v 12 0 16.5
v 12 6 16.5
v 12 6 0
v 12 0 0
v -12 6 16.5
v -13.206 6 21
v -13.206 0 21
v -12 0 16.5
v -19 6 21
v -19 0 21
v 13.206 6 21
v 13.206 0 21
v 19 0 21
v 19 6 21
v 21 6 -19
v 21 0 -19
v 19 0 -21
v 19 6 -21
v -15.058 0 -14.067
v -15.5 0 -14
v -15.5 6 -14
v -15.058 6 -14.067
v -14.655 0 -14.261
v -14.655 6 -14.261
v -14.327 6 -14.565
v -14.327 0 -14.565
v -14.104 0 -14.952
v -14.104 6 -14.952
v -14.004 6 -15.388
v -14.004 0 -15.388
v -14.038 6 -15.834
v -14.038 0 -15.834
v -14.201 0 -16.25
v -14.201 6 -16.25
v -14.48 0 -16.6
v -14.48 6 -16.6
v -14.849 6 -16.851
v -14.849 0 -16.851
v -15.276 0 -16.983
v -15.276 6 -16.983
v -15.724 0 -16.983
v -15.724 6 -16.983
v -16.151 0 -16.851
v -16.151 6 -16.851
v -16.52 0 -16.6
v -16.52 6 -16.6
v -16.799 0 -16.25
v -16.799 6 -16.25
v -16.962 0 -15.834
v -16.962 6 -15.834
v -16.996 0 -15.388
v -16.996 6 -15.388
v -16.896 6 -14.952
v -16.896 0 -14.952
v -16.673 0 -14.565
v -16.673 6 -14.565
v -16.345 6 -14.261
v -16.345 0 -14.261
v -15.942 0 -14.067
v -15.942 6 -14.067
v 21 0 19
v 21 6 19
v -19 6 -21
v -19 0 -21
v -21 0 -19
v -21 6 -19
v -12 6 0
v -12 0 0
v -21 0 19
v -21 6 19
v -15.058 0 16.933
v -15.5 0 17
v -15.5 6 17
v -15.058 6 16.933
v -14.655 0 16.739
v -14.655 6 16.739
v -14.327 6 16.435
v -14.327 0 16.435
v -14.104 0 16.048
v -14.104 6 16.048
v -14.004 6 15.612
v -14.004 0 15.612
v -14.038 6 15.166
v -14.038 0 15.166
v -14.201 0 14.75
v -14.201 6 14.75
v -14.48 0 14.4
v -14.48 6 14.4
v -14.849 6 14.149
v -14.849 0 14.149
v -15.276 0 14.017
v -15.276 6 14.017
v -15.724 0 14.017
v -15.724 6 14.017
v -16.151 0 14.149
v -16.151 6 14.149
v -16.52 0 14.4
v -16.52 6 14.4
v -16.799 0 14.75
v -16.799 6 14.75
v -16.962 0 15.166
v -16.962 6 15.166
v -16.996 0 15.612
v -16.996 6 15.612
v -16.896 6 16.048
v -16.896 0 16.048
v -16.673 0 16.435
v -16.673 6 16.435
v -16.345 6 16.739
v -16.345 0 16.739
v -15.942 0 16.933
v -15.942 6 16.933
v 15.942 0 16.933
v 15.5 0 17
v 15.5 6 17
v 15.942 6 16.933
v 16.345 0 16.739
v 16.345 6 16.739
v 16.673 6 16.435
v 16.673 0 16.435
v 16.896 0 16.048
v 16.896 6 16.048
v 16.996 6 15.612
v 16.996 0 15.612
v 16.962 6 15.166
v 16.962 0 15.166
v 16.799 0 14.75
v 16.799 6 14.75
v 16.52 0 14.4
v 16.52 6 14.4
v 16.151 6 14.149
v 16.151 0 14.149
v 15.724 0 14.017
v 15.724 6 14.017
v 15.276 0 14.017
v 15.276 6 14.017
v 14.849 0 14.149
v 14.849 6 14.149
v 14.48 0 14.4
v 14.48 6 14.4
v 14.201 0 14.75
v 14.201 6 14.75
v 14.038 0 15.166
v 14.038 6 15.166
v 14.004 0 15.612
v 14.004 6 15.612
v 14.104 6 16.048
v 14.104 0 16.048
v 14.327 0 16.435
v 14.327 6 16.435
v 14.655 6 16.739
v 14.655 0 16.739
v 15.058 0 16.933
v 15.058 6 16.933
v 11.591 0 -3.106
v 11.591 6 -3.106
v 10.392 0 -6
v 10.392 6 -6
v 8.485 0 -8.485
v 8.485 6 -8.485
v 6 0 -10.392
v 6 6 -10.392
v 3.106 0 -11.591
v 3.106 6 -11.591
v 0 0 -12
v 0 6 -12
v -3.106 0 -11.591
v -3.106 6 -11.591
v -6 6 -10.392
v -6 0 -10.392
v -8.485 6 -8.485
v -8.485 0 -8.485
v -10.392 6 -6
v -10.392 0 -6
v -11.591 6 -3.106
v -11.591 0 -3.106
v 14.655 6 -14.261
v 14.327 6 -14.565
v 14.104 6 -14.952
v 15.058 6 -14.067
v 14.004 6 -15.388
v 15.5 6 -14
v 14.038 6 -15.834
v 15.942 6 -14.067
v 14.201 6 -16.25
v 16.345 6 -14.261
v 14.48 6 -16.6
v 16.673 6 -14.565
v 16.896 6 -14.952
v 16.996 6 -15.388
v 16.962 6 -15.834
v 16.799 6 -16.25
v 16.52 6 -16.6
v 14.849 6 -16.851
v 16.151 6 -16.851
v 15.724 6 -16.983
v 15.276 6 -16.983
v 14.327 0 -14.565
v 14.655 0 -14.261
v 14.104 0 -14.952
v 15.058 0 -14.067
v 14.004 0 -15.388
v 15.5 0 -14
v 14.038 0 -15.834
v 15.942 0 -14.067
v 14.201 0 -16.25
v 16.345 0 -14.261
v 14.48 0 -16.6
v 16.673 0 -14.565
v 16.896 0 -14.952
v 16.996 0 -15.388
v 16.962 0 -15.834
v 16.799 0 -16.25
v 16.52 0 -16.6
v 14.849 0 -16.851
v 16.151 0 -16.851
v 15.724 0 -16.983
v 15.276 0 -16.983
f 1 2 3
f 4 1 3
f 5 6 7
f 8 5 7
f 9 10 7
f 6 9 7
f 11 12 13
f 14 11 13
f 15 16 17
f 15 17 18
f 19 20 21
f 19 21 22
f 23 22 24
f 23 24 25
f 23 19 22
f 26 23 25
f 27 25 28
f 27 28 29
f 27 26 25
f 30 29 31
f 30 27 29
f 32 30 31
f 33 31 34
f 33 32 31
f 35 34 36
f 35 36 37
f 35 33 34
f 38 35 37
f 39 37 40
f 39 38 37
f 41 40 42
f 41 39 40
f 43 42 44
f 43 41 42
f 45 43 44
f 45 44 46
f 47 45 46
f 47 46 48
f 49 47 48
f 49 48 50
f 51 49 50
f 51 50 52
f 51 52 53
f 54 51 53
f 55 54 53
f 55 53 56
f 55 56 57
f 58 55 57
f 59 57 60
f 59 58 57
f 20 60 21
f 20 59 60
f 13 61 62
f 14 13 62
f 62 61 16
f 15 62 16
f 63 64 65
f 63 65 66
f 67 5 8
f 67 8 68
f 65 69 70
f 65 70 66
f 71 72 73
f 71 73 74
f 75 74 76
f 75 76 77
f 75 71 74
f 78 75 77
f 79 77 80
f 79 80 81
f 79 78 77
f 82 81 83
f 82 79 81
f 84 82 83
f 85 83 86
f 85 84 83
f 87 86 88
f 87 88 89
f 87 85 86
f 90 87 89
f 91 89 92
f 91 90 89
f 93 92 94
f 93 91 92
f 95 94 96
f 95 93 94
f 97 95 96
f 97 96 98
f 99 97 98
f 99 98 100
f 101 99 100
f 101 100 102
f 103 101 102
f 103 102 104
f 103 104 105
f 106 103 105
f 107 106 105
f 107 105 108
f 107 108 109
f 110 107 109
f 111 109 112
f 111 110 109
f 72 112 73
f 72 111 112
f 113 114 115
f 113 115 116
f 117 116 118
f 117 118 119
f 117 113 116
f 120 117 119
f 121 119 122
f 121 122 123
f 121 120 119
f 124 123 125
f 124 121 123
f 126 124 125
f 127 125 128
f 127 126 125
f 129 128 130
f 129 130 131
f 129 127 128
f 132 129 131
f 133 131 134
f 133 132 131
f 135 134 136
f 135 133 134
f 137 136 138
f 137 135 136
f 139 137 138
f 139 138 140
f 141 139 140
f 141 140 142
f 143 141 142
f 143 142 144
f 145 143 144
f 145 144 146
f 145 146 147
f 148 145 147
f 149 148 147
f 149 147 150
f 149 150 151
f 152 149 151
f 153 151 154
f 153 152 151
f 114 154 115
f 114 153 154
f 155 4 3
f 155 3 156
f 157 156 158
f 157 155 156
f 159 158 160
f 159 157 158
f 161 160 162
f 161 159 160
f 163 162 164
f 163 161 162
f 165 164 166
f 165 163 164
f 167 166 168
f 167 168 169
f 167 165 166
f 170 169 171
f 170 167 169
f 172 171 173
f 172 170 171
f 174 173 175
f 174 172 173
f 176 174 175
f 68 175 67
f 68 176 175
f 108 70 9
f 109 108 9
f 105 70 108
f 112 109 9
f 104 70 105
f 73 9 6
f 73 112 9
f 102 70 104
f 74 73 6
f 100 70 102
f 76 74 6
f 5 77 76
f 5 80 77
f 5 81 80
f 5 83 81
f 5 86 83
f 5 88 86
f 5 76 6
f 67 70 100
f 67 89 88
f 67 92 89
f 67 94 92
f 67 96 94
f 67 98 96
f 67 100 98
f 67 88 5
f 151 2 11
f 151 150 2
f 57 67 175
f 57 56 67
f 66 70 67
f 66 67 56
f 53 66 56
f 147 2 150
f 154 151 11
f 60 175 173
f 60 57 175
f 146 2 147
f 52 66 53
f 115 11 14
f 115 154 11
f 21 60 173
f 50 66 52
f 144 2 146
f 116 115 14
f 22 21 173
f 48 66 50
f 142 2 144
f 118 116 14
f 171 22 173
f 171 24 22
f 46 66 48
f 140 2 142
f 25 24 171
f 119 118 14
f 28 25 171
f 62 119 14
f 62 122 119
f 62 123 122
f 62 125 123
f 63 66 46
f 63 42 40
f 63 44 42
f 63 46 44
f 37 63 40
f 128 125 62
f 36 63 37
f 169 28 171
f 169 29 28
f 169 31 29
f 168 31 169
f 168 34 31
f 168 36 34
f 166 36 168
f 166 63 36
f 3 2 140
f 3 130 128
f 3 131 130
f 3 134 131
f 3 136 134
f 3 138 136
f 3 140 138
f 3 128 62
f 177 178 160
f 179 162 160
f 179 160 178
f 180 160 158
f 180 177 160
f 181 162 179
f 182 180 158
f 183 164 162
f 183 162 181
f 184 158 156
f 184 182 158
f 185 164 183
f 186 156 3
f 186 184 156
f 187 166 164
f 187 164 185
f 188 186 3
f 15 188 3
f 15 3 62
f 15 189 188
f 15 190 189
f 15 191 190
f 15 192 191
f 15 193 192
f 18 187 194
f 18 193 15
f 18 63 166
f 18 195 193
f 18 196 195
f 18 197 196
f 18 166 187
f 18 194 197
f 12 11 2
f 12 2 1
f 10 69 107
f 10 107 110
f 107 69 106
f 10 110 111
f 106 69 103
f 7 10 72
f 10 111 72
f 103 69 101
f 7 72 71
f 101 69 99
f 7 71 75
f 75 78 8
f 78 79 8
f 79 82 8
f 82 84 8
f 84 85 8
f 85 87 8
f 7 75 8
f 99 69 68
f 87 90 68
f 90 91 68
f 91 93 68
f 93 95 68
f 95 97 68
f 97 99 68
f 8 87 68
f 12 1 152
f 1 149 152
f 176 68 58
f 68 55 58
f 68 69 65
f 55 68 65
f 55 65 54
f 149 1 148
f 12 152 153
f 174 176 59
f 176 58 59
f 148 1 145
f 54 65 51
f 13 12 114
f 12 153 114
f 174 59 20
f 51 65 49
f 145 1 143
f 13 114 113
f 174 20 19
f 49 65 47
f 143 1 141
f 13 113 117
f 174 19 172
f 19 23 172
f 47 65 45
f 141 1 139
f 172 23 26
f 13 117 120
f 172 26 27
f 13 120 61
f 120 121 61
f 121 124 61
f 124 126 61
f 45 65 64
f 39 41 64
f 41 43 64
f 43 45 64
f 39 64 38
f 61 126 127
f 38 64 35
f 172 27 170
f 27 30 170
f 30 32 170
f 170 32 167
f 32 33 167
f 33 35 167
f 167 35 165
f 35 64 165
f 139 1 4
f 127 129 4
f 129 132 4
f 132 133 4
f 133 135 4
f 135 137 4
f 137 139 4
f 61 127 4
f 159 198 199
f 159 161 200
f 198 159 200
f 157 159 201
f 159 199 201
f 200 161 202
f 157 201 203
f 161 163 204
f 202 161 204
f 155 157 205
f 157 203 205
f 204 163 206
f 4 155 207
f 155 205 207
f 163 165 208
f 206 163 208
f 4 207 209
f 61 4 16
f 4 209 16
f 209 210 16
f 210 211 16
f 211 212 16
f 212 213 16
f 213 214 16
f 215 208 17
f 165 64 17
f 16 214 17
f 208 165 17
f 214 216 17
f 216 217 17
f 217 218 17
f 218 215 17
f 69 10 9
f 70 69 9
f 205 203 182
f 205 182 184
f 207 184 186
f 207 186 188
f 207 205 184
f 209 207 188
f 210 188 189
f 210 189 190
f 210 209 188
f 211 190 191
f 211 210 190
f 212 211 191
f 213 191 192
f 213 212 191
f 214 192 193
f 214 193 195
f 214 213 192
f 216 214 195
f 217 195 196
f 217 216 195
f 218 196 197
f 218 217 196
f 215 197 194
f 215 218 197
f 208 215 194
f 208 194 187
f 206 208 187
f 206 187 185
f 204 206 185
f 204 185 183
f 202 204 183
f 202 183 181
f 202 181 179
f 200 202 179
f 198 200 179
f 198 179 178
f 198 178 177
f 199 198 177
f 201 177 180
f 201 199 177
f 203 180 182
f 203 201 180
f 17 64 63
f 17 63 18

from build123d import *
from OCP.BRepFilletAPI import BRepFilletAPI_MakeChamfer

# Parameters (mm, degrees)
SKETCH1_W           = 42
SKETCH1_H           = 42
SKETCH1_R           = 12
SKETCH1_R_2         = 1.5
BOSS_EXTRUDE1_DEPTH = 6
CHAMFER1_SIZE       = 2
SKETCH2_W           = 24
SKETCH2_H           = 21
CUT_EXTRUDE1_DEPTH  = 31.298514815
CHAMFER2_SIZE       = 4.5
CHAMFER2_SIZE2      = 1.205771366


with BuildPart() as part:
    # Sketch1 → Boss-Extrude1 (new body)
    with BuildSketch(Plane(origin=(0, 0, 0), x_dir=(1, 0, 0), z_dir=(0, 1, 0))):
        Rectangle(SKETCH1_W, SKETCH1_H)
        with Locations(Location((0, 0, 0), (0, 0, 270))):
            Circle(SKETCH1_R, mode=Mode.SUBTRACT)
        with Locations(Location((-15.5, 15.5, 0), (0, 0, 270))):
            Circle(SKETCH1_R_2, mode=Mode.SUBTRACT)
        with Locations(Location((15.5, 15.5, 0), (0, 0, 270))):
            Circle(SKETCH1_R_2, mode=Mode.SUBTRACT)
        with Locations(Location((15.5, -15.5, 0), (0, 0, 270))):
            Circle(SKETCH1_R_2, mode=Mode.SUBTRACT)
        with Locations(Location((-15.5, -15.5, 0), (0, 0, 270))):
            Circle(SKETCH1_R_2, mode=Mode.SUBTRACT)
    extrude(amount=BOSS_EXTRUDE1_DEPTH)

    # Chamfer1
    chamfer1_edges = [part.edges().sort_by_distance(p)[0] for p in [
        (21, 3, 21),
        (-21, 3, 21),
        (-21, 3, -21),
        (21, 3, -21),
    ]]
    chamfer(chamfer1_edges, length=CHAMFER1_SIZE)

    # Sketch2 → Cut-Extrude1 (cut, through all)
    with BuildSketch(Plane(origin=(0, 6, 0), x_dir=(1, 0, 0), z_dir=(0, 1, 0))):
        with Locations((0, -10.5)):
            Rectangle(SKETCH2_W, SKETCH2_H)
    extrude(amount=-CUT_EXTRUDE1_DEPTH, mode=Mode.SUBTRACT)

    # Chamfer2: one chamfer whose edges measure the first distance from different faces: ONE call of the kernel's chamfer builder (chamfer() names one face for all edges)
    chamfer2_edges_1 = [part.edges().sort_by_distance(p)[0] for p in [
        (12, 3, 21),
    ]]
    chamfer2_side_1 = [part.faces().sort_by_distance(p)[0] for p in [
        (12, 3, 10.5),
    ]]
    chamfer2_edges_2 = [part.edges().sort_by_distance(p)[0] for p in [
        (-12, 3, 21),
    ]]
    chamfer2_side_2 = [part.faces().sort_by_distance(p)[0] for p in [
        (-12, 3, 10.5),
    ]]
    chamfer2 = BRepFilletAPI_MakeChamfer(part.part.solid().wrapped)
    for e in chamfer2_edges_1:
        chamfer2.Add(CHAMFER2_SIZE, CHAMFER2_SIZE2, e.wrapped, chamfer2_side_1[0].wrapped)  # the first distance lies on this face
    for e in chamfer2_edges_2:
        chamfer2.Add(CHAMFER2_SIZE, CHAMFER2_SIZE2, e.wrapped, chamfer2_side_2[0].wrapped)  # the first distance lies on this face
    add(Compound.cast(chamfer2.Shape()), mode=Mode.REPLACE)


solid = part.part
